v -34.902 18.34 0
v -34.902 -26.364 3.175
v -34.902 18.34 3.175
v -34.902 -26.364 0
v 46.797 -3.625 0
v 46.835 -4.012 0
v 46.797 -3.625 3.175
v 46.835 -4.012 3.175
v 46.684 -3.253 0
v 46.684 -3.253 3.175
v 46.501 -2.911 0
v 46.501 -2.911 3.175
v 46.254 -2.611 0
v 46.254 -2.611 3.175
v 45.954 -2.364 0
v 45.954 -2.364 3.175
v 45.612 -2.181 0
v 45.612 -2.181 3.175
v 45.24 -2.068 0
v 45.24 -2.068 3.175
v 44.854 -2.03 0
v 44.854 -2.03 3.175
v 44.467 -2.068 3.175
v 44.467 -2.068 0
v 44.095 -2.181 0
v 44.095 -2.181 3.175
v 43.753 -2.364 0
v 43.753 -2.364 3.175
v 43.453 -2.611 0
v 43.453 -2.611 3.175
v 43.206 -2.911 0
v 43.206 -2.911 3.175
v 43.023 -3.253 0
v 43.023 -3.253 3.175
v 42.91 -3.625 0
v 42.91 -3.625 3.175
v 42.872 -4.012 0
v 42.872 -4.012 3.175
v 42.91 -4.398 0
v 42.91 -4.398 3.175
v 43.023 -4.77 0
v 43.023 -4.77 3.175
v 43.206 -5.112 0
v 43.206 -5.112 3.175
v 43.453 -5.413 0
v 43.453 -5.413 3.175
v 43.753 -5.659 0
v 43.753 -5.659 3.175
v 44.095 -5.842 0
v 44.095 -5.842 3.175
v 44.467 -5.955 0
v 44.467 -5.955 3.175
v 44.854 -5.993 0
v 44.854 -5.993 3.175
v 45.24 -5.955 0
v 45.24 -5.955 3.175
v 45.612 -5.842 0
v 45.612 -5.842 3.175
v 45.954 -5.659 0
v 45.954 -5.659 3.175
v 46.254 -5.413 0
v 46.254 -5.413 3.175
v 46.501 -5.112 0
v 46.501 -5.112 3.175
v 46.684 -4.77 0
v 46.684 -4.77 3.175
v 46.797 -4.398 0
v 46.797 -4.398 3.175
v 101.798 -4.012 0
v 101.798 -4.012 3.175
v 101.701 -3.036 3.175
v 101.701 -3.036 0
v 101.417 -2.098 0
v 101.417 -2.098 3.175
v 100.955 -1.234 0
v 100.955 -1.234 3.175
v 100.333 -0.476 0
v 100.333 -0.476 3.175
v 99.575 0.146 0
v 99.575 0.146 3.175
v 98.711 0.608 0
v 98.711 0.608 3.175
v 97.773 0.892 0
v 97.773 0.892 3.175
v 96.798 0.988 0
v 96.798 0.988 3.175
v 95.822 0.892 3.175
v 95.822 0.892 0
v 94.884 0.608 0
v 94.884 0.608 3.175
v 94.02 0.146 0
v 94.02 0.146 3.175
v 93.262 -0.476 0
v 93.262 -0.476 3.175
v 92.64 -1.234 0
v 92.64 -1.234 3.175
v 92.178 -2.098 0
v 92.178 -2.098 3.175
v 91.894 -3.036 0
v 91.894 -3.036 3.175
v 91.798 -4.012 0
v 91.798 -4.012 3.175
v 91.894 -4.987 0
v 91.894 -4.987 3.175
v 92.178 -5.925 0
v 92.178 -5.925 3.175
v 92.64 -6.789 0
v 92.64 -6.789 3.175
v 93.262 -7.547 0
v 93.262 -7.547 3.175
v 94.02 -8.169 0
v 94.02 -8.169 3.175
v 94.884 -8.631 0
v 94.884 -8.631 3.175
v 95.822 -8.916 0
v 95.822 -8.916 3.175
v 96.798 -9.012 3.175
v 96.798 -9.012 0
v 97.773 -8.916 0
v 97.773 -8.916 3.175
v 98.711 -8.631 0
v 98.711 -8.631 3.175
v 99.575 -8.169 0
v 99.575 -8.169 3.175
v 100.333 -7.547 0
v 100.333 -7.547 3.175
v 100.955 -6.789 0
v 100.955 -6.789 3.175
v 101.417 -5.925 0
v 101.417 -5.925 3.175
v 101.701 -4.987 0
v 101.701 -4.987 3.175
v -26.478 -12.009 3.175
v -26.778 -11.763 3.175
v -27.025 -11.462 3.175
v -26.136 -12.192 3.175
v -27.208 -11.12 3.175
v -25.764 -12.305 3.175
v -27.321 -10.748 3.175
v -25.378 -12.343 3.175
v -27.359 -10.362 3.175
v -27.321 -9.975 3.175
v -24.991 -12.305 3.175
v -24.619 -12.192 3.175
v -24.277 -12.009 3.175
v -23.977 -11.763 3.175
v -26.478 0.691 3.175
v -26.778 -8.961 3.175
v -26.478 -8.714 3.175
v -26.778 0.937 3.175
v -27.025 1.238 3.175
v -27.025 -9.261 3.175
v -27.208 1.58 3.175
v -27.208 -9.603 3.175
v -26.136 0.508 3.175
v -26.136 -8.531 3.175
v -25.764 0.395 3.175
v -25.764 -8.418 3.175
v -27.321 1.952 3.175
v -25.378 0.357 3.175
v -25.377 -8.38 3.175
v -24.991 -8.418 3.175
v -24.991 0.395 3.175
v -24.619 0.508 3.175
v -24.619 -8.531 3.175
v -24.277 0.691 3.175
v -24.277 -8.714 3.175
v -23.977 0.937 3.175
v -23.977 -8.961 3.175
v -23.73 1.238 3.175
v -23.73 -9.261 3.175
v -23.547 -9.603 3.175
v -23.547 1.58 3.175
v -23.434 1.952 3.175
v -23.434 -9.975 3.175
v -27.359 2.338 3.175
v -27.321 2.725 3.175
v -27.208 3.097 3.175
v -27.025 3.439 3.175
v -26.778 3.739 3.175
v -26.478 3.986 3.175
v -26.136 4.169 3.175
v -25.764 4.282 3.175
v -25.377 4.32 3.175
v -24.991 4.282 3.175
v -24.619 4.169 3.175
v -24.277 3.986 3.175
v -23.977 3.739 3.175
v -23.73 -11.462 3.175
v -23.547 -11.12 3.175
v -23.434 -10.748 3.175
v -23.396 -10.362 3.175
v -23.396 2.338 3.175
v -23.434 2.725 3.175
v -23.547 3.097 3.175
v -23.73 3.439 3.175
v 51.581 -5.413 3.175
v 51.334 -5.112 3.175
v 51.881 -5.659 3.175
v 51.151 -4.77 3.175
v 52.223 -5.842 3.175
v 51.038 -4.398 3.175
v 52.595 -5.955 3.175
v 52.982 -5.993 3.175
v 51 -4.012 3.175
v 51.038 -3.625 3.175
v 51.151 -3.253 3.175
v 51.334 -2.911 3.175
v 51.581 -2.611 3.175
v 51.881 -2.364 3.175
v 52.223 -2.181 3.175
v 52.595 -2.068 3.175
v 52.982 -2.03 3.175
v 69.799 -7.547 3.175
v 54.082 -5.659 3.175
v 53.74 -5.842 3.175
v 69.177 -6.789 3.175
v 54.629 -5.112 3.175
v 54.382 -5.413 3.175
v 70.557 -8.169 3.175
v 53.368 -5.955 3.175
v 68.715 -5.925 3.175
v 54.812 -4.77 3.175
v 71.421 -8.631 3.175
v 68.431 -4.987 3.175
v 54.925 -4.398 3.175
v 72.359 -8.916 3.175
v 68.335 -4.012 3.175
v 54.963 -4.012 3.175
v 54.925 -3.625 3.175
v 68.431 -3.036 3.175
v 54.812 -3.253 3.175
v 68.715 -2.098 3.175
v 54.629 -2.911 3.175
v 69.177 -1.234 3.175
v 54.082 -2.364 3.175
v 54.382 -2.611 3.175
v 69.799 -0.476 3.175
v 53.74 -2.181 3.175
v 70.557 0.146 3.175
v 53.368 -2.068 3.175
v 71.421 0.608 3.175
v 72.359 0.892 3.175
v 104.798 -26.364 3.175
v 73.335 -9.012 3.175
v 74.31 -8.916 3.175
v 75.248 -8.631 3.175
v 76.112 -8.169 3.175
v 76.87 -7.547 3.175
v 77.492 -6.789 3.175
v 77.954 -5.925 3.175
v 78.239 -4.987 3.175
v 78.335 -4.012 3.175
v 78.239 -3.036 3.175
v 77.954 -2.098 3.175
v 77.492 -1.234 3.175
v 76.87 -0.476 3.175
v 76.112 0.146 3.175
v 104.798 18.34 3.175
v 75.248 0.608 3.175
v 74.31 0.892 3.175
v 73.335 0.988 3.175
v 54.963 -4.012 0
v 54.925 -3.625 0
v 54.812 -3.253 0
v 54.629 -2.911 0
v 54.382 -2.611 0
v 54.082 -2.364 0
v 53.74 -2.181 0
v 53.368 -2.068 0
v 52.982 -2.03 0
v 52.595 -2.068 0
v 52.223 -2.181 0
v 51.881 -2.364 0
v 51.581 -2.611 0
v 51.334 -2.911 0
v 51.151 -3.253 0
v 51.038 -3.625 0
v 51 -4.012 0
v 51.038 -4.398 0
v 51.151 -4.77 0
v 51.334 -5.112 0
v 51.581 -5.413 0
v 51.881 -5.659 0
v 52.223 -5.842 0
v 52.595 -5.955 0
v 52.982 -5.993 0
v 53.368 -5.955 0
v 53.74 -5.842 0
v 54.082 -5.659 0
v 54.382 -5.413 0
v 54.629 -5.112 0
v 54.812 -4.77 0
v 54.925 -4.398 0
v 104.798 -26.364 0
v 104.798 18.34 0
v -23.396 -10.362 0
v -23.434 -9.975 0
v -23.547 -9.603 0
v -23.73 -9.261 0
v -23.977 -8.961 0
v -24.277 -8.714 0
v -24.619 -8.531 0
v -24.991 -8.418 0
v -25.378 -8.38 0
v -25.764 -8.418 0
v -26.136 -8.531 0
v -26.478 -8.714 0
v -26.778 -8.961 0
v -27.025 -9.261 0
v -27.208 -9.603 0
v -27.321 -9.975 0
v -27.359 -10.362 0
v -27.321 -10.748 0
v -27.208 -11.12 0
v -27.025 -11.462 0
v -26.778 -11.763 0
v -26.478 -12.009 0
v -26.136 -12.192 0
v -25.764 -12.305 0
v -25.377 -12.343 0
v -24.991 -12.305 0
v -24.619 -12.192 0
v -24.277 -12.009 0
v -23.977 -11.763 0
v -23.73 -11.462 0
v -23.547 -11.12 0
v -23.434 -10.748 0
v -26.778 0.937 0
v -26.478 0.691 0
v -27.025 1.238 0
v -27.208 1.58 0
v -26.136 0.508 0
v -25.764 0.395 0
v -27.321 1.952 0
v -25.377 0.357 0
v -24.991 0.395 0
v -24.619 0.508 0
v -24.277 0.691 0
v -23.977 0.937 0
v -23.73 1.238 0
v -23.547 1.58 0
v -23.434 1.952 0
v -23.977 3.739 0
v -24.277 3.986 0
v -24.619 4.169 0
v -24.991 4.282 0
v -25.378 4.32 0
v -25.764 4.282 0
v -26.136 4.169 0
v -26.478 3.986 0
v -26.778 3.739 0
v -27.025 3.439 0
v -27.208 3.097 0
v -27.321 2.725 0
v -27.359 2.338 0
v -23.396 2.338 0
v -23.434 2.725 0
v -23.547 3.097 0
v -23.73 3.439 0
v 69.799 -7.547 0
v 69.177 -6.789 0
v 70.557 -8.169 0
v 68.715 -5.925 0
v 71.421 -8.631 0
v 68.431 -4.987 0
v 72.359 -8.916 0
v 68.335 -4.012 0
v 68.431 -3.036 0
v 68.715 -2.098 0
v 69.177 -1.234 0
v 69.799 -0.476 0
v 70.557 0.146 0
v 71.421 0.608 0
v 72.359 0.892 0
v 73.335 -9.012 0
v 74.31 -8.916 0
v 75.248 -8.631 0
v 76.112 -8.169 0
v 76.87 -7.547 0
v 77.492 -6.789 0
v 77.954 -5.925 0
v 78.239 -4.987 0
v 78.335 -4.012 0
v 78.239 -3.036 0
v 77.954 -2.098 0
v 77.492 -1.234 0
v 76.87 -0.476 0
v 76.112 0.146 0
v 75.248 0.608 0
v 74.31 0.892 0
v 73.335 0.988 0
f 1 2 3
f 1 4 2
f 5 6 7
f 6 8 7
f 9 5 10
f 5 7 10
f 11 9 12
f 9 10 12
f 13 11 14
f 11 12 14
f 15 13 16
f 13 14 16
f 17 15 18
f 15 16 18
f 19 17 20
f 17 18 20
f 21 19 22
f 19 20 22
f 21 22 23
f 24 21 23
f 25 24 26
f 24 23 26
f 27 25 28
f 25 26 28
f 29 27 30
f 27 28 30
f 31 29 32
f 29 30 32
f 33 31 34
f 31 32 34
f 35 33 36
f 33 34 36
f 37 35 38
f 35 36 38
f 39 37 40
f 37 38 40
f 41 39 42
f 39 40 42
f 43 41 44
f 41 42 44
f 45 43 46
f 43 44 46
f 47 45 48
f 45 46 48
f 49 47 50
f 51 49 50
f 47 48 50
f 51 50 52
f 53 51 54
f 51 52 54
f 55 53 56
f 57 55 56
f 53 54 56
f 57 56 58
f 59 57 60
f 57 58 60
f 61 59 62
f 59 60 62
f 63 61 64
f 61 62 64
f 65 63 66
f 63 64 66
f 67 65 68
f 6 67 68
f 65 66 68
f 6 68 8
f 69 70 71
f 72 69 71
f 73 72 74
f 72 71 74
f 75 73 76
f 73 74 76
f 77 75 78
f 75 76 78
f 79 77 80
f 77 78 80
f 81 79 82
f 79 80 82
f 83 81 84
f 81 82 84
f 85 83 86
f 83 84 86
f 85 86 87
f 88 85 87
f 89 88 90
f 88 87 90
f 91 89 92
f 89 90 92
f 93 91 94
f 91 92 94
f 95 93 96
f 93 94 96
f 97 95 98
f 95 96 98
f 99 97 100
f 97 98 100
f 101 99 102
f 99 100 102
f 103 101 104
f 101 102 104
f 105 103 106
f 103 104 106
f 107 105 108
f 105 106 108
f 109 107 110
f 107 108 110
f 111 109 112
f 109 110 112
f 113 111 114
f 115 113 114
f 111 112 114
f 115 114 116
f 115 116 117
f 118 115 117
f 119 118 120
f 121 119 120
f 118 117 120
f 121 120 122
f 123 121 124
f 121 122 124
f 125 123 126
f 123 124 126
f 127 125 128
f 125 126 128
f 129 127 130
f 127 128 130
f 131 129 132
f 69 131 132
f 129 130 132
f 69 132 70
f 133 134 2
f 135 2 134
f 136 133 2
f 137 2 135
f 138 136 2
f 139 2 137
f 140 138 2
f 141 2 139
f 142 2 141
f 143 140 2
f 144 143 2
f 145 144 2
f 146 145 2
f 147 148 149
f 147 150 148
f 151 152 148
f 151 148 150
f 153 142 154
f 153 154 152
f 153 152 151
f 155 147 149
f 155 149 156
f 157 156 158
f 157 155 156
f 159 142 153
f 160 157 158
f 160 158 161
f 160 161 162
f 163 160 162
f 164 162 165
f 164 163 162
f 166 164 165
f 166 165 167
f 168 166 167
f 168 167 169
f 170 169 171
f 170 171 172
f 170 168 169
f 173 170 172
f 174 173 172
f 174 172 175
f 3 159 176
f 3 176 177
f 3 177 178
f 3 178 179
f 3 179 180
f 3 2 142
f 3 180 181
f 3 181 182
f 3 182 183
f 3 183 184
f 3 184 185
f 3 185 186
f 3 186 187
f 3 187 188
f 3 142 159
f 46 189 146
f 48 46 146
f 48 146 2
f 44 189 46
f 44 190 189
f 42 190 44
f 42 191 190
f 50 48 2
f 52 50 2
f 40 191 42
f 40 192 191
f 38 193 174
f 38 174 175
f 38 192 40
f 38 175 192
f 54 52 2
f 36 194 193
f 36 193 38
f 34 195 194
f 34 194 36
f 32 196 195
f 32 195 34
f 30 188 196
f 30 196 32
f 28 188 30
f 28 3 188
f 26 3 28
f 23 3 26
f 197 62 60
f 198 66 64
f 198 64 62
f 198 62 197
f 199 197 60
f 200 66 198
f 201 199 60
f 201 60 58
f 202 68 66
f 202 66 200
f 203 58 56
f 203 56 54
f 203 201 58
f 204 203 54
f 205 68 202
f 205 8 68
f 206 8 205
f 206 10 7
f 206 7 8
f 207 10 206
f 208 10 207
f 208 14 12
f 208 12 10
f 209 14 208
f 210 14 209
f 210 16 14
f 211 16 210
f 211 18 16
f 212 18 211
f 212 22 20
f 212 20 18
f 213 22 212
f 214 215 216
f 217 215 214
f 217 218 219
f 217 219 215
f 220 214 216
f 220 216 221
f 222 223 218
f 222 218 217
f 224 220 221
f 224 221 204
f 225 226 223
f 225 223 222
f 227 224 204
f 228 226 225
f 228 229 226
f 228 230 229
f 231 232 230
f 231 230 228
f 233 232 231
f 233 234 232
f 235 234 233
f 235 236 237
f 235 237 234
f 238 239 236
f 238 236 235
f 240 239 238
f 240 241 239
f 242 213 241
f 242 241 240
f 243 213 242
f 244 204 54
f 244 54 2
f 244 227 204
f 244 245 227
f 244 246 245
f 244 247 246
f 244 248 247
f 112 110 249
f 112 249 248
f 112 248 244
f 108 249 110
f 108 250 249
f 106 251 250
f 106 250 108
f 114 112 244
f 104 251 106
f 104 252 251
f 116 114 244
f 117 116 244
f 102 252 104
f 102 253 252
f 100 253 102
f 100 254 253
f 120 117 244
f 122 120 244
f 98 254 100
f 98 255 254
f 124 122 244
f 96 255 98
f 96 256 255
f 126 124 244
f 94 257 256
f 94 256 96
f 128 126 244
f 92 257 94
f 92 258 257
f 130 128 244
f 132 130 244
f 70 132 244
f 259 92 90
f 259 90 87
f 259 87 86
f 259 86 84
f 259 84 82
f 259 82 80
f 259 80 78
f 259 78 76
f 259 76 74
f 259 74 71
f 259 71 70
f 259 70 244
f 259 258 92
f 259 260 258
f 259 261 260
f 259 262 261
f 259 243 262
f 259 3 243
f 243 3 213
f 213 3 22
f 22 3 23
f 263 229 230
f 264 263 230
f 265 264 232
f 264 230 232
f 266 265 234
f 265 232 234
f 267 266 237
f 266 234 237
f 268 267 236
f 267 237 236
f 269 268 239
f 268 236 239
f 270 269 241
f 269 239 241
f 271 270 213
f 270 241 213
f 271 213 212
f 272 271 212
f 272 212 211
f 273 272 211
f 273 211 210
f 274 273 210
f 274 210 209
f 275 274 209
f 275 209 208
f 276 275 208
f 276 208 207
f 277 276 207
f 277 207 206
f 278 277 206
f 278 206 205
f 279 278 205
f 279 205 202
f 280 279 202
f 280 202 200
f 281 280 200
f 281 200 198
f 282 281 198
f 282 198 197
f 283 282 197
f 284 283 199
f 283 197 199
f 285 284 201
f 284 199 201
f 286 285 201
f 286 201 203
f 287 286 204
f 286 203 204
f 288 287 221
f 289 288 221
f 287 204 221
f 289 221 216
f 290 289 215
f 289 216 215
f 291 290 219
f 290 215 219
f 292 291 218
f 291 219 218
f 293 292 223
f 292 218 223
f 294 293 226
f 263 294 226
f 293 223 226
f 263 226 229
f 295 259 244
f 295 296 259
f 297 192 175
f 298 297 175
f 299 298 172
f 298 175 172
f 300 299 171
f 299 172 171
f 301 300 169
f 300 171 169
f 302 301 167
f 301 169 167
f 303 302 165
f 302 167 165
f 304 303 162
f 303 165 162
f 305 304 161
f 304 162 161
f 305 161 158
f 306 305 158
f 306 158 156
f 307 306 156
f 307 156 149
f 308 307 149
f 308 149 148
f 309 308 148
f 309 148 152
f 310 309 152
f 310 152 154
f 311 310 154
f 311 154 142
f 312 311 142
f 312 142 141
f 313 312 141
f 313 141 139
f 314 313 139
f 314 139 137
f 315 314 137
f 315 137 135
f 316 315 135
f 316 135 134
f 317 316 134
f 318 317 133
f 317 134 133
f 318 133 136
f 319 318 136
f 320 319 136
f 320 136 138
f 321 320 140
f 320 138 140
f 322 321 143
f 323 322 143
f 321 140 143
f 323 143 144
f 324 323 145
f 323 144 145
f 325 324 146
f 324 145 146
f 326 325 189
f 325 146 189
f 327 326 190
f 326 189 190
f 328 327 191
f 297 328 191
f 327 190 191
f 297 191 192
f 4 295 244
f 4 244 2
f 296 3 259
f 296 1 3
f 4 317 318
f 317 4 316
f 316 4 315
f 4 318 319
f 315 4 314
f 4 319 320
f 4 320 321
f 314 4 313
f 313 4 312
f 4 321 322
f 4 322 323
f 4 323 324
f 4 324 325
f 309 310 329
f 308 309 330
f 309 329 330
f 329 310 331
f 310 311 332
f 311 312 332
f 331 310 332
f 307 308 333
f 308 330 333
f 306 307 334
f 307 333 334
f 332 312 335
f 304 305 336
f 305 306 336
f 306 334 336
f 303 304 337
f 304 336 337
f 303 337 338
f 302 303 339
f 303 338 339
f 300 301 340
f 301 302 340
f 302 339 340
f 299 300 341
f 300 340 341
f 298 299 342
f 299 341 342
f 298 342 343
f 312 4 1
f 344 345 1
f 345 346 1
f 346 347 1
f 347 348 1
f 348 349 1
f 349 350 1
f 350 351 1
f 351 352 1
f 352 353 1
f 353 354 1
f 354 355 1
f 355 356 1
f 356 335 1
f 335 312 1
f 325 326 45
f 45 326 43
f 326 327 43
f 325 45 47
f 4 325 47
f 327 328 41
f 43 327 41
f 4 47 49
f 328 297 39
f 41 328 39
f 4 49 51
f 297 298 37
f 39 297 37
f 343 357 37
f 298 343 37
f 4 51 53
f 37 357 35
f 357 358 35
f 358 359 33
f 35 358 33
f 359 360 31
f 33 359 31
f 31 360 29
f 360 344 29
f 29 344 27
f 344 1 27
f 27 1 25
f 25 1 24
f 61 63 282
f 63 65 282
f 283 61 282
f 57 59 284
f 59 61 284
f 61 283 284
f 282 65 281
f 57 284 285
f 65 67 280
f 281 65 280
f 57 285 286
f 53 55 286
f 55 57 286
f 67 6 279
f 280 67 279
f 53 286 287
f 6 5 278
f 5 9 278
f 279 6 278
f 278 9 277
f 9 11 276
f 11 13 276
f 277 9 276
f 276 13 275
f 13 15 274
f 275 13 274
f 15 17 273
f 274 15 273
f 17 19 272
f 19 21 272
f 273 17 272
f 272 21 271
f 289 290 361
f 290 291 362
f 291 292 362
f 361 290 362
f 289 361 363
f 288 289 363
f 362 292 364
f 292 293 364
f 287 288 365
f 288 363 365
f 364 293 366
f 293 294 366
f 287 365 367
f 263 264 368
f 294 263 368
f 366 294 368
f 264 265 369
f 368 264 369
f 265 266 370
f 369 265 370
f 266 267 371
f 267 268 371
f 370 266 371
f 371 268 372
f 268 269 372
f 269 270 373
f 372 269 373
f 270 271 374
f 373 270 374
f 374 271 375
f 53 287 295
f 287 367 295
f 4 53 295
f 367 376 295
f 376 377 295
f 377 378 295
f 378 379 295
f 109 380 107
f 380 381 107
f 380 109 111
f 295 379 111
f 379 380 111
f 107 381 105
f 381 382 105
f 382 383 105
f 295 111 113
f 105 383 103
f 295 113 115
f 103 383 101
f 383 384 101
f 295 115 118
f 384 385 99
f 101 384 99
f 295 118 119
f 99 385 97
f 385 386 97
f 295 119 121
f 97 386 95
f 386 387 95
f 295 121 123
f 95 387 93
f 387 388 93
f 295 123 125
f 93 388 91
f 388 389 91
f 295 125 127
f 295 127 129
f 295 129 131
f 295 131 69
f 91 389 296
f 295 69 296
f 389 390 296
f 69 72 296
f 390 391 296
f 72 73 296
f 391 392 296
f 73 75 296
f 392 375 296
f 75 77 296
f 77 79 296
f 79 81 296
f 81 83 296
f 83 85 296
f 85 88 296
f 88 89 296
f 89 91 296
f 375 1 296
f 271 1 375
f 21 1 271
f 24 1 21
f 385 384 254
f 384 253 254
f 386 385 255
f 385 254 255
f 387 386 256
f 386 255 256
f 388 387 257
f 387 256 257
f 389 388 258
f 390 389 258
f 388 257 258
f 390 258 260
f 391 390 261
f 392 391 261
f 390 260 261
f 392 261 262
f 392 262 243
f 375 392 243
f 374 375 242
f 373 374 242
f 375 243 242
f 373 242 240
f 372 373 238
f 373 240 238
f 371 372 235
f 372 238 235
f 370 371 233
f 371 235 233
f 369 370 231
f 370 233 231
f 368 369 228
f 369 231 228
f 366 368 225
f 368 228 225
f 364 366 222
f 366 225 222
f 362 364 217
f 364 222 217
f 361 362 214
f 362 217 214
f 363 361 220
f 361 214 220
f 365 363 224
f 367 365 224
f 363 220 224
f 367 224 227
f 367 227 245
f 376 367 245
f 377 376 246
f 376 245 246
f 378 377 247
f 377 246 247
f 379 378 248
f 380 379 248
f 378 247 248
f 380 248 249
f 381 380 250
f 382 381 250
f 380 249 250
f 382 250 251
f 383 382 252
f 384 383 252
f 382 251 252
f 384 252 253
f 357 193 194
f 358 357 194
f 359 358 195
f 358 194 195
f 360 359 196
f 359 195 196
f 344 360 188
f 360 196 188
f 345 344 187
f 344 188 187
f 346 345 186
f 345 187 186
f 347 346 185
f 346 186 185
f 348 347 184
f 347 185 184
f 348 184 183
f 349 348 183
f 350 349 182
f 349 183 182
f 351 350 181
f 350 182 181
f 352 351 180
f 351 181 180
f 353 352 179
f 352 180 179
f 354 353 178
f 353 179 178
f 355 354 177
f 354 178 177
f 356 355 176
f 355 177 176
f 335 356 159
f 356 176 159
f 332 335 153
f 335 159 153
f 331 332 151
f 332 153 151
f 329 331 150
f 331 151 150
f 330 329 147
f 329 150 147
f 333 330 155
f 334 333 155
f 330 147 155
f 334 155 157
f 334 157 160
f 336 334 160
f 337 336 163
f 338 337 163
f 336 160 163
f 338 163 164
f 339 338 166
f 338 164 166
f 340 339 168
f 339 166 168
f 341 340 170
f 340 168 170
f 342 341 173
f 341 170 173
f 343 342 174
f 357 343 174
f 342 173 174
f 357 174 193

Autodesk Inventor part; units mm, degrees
ref_plane "YZ Plane" through (0, 0, 0) normal (1, 0, 0) x (0, 1, 0)
ref_plane "XZ Plane" through (0, 0, 0) normal (0, 1, 0) x (-1, 0, 0)
ref_plane "XY Plane" through (0, 0, 0) normal (0, 0, 1) x (1, 0, 0)
sketch "Sketch1" plane through (0, 0, 0) normal (0, 0, 1) x (1, 0, 0)
  line L0 (-34.9025, 5.6404) -> (104.7975, 5.6404)
  line L1 (104.7975, 5.6404) -> (104.7975, -26.3636)
  line L2 (104.7975, -26.3636) -> (-34.9025, -26.3636)
  line L3 (-34.9025, -26.3636) -> (-34.9025, 5.6404)
  point P0 (0, 0)
  dimension "d0" = 139.7
  dimension "d1" = 32.004
extrude "Extrusion1" add sketch "Sketch1" along normal blind 3.175
sketch "Sketch2" plane through (-34.9025, 5.6404, 0) normal (0, 1, 0) x (1, 0, 0)
  line L0 (0, -3.175) -> (139.7, -3.175) projected
  line L1 (139.7, 0) -> (139.7, -3.175) projected
  line L2 (0, 0) -> (139.7, 0) projected
  line L3 (0, 0) -> (0, -3.175) projected
  point P0 (34.9025, 0)
extrude "Extrusion2" add sketch "Sketch2" along normal blind 12.7
sketch "Sketch3" plane through (0, 0, 3.175) normal (0, 0, 1) x (1, 0, 0)
  line L0 (104.7975, -26.3636) -> (-34.9025, -26.3636) projected
  line L1 (-34.9025, 18.3404) -> (-15.8525, 18.3404)
  line L2 (-15.8525, 18.3404) -> (-15.8525, -26.3636)
  line L3 (-15.8525, -26.3636) -> (-34.9025, -26.3636)
  line L4 (-34.9025, -26.3636) -> (-34.9025, 18.3404)
  line L5 (-34.9025, -4.0116) -> (-25.3775, -4.0116)
  line L6 (-25.3775, -4.0116) -> (-25.3775, 2.3384)
  line L7 (-25.3775, 2.3384) -> (-34.9025, 2.3384)
  line L8 (-34.9025, 2.3384) -> (-34.9025, -4.0116)
  line L9 (-25.3775, -4.0116) -> (-25.3775, -10.3616)
  circle A0 centre (-25.3775, 2.3384) radius 1.9812
  circle A1 centre (-25.3775, -10.3616) radius 1.9812
  point P0 (0, 0)
  dimension "d6" = 19.05
  dimension "d7" = 6.35
  dimension "d8" = 6.35
  dimension "d9" = 3.9624
extrude "Extrusion3" cut sketch "Sketch3" against normal blind 12.7 contours A1 | A0 L6 L7 | L7 L6 A0
sketch "Sketch4" plane through (0, 0, 3.175) normal (0, 0, 1) x (1, 0, 0)
  line L0 (104.7975, 18.3404) -> (104.7975, -26.3636) projected
  line L1 (104.7975, -26.3636) -> (-34.9025, -26.3636) projected
  line L2 (104.7975, -4.0116) -> (96.7965, -4.0116)
  circle A0 centre (96.7965, -4.0116) radius 5.0038
  point P0 (0, 0)
  dimension "d12" = 8.001
  dimension "d13" = 10.0076
extrude "Extrusion4" cut sketch "Sketch4" against normal blind 12.7
sketch "Sketch5" plane through (0, 0, 3.175) normal (0, 0, 1) x (1, 0, 0)
  circle A0 centre (96.7965, -4.0116) radius 5.0038 projected
  point P0 (0, 0)
extrude "Extrusion5" add sketch "Sketch5" against normal blind 3.175
sketch "Sketch6" plane through (0, 0, 3.175) normal (0, 0, 1) x (1, 0, 0)
  line L0 (104.7975, 18.3404) -> (104.7975, -26.3636) projected
  line L1 (104.7975, -26.3636) -> (-34.9025, -26.3636) projected
  line L2 (104.7975, -4.0116) -> (96.7975, -4.0116)
  circle A0 centre (96.7975, -4.0116) radius 5
  line L3 (103.3346, -4.0116) -> (73.3346, -4.0116)
  circle A1 centre (73.3346, -4.0116) radius 5
  point P0 (0, 0)
  dimension "d18" = 8
  dimension "d19" = 10
  dimension "d20" = 30
extrude "Extrusion6" cut sketch "Sketch6" against normal blind 3.175
sketch "Sketch7" plane through (0, 0, 3.175) normal (0, 0, 1) x (1, 0, 0)
  line L0 (-34.9025, -26.3636) -> (-34.9025, 18.3404) projected
  line L1 (104.7975, -26.3636) -> (-34.9025, -26.3636) projected
  line L2 (-34.9025, -4.0116) -> (-15.8525, -4.0116)
  line L3 (-15.8525, -4.0116) -> (52.9815, -4.0116)
  line L4 (52.9815, -4.0116) -> (44.8535, -4.0116)
  circle A0 centre (52.9815, -4.0116) radius 1.9812
  circle A1 centre (44.8535, -4.0116) radius 1.9812
  point P0 (0, 0)
  dimension "d23" = 19.05
  dimension "d24" = 68.834
  dimension "d25" = 8.128
  dimension "d26" = 3.9624
  dimension "d27" = 3.9624
extrude "Extrusion7" cut sketch "Sketch7" against normal blind 25.4
properties part number "linac connector bar"
